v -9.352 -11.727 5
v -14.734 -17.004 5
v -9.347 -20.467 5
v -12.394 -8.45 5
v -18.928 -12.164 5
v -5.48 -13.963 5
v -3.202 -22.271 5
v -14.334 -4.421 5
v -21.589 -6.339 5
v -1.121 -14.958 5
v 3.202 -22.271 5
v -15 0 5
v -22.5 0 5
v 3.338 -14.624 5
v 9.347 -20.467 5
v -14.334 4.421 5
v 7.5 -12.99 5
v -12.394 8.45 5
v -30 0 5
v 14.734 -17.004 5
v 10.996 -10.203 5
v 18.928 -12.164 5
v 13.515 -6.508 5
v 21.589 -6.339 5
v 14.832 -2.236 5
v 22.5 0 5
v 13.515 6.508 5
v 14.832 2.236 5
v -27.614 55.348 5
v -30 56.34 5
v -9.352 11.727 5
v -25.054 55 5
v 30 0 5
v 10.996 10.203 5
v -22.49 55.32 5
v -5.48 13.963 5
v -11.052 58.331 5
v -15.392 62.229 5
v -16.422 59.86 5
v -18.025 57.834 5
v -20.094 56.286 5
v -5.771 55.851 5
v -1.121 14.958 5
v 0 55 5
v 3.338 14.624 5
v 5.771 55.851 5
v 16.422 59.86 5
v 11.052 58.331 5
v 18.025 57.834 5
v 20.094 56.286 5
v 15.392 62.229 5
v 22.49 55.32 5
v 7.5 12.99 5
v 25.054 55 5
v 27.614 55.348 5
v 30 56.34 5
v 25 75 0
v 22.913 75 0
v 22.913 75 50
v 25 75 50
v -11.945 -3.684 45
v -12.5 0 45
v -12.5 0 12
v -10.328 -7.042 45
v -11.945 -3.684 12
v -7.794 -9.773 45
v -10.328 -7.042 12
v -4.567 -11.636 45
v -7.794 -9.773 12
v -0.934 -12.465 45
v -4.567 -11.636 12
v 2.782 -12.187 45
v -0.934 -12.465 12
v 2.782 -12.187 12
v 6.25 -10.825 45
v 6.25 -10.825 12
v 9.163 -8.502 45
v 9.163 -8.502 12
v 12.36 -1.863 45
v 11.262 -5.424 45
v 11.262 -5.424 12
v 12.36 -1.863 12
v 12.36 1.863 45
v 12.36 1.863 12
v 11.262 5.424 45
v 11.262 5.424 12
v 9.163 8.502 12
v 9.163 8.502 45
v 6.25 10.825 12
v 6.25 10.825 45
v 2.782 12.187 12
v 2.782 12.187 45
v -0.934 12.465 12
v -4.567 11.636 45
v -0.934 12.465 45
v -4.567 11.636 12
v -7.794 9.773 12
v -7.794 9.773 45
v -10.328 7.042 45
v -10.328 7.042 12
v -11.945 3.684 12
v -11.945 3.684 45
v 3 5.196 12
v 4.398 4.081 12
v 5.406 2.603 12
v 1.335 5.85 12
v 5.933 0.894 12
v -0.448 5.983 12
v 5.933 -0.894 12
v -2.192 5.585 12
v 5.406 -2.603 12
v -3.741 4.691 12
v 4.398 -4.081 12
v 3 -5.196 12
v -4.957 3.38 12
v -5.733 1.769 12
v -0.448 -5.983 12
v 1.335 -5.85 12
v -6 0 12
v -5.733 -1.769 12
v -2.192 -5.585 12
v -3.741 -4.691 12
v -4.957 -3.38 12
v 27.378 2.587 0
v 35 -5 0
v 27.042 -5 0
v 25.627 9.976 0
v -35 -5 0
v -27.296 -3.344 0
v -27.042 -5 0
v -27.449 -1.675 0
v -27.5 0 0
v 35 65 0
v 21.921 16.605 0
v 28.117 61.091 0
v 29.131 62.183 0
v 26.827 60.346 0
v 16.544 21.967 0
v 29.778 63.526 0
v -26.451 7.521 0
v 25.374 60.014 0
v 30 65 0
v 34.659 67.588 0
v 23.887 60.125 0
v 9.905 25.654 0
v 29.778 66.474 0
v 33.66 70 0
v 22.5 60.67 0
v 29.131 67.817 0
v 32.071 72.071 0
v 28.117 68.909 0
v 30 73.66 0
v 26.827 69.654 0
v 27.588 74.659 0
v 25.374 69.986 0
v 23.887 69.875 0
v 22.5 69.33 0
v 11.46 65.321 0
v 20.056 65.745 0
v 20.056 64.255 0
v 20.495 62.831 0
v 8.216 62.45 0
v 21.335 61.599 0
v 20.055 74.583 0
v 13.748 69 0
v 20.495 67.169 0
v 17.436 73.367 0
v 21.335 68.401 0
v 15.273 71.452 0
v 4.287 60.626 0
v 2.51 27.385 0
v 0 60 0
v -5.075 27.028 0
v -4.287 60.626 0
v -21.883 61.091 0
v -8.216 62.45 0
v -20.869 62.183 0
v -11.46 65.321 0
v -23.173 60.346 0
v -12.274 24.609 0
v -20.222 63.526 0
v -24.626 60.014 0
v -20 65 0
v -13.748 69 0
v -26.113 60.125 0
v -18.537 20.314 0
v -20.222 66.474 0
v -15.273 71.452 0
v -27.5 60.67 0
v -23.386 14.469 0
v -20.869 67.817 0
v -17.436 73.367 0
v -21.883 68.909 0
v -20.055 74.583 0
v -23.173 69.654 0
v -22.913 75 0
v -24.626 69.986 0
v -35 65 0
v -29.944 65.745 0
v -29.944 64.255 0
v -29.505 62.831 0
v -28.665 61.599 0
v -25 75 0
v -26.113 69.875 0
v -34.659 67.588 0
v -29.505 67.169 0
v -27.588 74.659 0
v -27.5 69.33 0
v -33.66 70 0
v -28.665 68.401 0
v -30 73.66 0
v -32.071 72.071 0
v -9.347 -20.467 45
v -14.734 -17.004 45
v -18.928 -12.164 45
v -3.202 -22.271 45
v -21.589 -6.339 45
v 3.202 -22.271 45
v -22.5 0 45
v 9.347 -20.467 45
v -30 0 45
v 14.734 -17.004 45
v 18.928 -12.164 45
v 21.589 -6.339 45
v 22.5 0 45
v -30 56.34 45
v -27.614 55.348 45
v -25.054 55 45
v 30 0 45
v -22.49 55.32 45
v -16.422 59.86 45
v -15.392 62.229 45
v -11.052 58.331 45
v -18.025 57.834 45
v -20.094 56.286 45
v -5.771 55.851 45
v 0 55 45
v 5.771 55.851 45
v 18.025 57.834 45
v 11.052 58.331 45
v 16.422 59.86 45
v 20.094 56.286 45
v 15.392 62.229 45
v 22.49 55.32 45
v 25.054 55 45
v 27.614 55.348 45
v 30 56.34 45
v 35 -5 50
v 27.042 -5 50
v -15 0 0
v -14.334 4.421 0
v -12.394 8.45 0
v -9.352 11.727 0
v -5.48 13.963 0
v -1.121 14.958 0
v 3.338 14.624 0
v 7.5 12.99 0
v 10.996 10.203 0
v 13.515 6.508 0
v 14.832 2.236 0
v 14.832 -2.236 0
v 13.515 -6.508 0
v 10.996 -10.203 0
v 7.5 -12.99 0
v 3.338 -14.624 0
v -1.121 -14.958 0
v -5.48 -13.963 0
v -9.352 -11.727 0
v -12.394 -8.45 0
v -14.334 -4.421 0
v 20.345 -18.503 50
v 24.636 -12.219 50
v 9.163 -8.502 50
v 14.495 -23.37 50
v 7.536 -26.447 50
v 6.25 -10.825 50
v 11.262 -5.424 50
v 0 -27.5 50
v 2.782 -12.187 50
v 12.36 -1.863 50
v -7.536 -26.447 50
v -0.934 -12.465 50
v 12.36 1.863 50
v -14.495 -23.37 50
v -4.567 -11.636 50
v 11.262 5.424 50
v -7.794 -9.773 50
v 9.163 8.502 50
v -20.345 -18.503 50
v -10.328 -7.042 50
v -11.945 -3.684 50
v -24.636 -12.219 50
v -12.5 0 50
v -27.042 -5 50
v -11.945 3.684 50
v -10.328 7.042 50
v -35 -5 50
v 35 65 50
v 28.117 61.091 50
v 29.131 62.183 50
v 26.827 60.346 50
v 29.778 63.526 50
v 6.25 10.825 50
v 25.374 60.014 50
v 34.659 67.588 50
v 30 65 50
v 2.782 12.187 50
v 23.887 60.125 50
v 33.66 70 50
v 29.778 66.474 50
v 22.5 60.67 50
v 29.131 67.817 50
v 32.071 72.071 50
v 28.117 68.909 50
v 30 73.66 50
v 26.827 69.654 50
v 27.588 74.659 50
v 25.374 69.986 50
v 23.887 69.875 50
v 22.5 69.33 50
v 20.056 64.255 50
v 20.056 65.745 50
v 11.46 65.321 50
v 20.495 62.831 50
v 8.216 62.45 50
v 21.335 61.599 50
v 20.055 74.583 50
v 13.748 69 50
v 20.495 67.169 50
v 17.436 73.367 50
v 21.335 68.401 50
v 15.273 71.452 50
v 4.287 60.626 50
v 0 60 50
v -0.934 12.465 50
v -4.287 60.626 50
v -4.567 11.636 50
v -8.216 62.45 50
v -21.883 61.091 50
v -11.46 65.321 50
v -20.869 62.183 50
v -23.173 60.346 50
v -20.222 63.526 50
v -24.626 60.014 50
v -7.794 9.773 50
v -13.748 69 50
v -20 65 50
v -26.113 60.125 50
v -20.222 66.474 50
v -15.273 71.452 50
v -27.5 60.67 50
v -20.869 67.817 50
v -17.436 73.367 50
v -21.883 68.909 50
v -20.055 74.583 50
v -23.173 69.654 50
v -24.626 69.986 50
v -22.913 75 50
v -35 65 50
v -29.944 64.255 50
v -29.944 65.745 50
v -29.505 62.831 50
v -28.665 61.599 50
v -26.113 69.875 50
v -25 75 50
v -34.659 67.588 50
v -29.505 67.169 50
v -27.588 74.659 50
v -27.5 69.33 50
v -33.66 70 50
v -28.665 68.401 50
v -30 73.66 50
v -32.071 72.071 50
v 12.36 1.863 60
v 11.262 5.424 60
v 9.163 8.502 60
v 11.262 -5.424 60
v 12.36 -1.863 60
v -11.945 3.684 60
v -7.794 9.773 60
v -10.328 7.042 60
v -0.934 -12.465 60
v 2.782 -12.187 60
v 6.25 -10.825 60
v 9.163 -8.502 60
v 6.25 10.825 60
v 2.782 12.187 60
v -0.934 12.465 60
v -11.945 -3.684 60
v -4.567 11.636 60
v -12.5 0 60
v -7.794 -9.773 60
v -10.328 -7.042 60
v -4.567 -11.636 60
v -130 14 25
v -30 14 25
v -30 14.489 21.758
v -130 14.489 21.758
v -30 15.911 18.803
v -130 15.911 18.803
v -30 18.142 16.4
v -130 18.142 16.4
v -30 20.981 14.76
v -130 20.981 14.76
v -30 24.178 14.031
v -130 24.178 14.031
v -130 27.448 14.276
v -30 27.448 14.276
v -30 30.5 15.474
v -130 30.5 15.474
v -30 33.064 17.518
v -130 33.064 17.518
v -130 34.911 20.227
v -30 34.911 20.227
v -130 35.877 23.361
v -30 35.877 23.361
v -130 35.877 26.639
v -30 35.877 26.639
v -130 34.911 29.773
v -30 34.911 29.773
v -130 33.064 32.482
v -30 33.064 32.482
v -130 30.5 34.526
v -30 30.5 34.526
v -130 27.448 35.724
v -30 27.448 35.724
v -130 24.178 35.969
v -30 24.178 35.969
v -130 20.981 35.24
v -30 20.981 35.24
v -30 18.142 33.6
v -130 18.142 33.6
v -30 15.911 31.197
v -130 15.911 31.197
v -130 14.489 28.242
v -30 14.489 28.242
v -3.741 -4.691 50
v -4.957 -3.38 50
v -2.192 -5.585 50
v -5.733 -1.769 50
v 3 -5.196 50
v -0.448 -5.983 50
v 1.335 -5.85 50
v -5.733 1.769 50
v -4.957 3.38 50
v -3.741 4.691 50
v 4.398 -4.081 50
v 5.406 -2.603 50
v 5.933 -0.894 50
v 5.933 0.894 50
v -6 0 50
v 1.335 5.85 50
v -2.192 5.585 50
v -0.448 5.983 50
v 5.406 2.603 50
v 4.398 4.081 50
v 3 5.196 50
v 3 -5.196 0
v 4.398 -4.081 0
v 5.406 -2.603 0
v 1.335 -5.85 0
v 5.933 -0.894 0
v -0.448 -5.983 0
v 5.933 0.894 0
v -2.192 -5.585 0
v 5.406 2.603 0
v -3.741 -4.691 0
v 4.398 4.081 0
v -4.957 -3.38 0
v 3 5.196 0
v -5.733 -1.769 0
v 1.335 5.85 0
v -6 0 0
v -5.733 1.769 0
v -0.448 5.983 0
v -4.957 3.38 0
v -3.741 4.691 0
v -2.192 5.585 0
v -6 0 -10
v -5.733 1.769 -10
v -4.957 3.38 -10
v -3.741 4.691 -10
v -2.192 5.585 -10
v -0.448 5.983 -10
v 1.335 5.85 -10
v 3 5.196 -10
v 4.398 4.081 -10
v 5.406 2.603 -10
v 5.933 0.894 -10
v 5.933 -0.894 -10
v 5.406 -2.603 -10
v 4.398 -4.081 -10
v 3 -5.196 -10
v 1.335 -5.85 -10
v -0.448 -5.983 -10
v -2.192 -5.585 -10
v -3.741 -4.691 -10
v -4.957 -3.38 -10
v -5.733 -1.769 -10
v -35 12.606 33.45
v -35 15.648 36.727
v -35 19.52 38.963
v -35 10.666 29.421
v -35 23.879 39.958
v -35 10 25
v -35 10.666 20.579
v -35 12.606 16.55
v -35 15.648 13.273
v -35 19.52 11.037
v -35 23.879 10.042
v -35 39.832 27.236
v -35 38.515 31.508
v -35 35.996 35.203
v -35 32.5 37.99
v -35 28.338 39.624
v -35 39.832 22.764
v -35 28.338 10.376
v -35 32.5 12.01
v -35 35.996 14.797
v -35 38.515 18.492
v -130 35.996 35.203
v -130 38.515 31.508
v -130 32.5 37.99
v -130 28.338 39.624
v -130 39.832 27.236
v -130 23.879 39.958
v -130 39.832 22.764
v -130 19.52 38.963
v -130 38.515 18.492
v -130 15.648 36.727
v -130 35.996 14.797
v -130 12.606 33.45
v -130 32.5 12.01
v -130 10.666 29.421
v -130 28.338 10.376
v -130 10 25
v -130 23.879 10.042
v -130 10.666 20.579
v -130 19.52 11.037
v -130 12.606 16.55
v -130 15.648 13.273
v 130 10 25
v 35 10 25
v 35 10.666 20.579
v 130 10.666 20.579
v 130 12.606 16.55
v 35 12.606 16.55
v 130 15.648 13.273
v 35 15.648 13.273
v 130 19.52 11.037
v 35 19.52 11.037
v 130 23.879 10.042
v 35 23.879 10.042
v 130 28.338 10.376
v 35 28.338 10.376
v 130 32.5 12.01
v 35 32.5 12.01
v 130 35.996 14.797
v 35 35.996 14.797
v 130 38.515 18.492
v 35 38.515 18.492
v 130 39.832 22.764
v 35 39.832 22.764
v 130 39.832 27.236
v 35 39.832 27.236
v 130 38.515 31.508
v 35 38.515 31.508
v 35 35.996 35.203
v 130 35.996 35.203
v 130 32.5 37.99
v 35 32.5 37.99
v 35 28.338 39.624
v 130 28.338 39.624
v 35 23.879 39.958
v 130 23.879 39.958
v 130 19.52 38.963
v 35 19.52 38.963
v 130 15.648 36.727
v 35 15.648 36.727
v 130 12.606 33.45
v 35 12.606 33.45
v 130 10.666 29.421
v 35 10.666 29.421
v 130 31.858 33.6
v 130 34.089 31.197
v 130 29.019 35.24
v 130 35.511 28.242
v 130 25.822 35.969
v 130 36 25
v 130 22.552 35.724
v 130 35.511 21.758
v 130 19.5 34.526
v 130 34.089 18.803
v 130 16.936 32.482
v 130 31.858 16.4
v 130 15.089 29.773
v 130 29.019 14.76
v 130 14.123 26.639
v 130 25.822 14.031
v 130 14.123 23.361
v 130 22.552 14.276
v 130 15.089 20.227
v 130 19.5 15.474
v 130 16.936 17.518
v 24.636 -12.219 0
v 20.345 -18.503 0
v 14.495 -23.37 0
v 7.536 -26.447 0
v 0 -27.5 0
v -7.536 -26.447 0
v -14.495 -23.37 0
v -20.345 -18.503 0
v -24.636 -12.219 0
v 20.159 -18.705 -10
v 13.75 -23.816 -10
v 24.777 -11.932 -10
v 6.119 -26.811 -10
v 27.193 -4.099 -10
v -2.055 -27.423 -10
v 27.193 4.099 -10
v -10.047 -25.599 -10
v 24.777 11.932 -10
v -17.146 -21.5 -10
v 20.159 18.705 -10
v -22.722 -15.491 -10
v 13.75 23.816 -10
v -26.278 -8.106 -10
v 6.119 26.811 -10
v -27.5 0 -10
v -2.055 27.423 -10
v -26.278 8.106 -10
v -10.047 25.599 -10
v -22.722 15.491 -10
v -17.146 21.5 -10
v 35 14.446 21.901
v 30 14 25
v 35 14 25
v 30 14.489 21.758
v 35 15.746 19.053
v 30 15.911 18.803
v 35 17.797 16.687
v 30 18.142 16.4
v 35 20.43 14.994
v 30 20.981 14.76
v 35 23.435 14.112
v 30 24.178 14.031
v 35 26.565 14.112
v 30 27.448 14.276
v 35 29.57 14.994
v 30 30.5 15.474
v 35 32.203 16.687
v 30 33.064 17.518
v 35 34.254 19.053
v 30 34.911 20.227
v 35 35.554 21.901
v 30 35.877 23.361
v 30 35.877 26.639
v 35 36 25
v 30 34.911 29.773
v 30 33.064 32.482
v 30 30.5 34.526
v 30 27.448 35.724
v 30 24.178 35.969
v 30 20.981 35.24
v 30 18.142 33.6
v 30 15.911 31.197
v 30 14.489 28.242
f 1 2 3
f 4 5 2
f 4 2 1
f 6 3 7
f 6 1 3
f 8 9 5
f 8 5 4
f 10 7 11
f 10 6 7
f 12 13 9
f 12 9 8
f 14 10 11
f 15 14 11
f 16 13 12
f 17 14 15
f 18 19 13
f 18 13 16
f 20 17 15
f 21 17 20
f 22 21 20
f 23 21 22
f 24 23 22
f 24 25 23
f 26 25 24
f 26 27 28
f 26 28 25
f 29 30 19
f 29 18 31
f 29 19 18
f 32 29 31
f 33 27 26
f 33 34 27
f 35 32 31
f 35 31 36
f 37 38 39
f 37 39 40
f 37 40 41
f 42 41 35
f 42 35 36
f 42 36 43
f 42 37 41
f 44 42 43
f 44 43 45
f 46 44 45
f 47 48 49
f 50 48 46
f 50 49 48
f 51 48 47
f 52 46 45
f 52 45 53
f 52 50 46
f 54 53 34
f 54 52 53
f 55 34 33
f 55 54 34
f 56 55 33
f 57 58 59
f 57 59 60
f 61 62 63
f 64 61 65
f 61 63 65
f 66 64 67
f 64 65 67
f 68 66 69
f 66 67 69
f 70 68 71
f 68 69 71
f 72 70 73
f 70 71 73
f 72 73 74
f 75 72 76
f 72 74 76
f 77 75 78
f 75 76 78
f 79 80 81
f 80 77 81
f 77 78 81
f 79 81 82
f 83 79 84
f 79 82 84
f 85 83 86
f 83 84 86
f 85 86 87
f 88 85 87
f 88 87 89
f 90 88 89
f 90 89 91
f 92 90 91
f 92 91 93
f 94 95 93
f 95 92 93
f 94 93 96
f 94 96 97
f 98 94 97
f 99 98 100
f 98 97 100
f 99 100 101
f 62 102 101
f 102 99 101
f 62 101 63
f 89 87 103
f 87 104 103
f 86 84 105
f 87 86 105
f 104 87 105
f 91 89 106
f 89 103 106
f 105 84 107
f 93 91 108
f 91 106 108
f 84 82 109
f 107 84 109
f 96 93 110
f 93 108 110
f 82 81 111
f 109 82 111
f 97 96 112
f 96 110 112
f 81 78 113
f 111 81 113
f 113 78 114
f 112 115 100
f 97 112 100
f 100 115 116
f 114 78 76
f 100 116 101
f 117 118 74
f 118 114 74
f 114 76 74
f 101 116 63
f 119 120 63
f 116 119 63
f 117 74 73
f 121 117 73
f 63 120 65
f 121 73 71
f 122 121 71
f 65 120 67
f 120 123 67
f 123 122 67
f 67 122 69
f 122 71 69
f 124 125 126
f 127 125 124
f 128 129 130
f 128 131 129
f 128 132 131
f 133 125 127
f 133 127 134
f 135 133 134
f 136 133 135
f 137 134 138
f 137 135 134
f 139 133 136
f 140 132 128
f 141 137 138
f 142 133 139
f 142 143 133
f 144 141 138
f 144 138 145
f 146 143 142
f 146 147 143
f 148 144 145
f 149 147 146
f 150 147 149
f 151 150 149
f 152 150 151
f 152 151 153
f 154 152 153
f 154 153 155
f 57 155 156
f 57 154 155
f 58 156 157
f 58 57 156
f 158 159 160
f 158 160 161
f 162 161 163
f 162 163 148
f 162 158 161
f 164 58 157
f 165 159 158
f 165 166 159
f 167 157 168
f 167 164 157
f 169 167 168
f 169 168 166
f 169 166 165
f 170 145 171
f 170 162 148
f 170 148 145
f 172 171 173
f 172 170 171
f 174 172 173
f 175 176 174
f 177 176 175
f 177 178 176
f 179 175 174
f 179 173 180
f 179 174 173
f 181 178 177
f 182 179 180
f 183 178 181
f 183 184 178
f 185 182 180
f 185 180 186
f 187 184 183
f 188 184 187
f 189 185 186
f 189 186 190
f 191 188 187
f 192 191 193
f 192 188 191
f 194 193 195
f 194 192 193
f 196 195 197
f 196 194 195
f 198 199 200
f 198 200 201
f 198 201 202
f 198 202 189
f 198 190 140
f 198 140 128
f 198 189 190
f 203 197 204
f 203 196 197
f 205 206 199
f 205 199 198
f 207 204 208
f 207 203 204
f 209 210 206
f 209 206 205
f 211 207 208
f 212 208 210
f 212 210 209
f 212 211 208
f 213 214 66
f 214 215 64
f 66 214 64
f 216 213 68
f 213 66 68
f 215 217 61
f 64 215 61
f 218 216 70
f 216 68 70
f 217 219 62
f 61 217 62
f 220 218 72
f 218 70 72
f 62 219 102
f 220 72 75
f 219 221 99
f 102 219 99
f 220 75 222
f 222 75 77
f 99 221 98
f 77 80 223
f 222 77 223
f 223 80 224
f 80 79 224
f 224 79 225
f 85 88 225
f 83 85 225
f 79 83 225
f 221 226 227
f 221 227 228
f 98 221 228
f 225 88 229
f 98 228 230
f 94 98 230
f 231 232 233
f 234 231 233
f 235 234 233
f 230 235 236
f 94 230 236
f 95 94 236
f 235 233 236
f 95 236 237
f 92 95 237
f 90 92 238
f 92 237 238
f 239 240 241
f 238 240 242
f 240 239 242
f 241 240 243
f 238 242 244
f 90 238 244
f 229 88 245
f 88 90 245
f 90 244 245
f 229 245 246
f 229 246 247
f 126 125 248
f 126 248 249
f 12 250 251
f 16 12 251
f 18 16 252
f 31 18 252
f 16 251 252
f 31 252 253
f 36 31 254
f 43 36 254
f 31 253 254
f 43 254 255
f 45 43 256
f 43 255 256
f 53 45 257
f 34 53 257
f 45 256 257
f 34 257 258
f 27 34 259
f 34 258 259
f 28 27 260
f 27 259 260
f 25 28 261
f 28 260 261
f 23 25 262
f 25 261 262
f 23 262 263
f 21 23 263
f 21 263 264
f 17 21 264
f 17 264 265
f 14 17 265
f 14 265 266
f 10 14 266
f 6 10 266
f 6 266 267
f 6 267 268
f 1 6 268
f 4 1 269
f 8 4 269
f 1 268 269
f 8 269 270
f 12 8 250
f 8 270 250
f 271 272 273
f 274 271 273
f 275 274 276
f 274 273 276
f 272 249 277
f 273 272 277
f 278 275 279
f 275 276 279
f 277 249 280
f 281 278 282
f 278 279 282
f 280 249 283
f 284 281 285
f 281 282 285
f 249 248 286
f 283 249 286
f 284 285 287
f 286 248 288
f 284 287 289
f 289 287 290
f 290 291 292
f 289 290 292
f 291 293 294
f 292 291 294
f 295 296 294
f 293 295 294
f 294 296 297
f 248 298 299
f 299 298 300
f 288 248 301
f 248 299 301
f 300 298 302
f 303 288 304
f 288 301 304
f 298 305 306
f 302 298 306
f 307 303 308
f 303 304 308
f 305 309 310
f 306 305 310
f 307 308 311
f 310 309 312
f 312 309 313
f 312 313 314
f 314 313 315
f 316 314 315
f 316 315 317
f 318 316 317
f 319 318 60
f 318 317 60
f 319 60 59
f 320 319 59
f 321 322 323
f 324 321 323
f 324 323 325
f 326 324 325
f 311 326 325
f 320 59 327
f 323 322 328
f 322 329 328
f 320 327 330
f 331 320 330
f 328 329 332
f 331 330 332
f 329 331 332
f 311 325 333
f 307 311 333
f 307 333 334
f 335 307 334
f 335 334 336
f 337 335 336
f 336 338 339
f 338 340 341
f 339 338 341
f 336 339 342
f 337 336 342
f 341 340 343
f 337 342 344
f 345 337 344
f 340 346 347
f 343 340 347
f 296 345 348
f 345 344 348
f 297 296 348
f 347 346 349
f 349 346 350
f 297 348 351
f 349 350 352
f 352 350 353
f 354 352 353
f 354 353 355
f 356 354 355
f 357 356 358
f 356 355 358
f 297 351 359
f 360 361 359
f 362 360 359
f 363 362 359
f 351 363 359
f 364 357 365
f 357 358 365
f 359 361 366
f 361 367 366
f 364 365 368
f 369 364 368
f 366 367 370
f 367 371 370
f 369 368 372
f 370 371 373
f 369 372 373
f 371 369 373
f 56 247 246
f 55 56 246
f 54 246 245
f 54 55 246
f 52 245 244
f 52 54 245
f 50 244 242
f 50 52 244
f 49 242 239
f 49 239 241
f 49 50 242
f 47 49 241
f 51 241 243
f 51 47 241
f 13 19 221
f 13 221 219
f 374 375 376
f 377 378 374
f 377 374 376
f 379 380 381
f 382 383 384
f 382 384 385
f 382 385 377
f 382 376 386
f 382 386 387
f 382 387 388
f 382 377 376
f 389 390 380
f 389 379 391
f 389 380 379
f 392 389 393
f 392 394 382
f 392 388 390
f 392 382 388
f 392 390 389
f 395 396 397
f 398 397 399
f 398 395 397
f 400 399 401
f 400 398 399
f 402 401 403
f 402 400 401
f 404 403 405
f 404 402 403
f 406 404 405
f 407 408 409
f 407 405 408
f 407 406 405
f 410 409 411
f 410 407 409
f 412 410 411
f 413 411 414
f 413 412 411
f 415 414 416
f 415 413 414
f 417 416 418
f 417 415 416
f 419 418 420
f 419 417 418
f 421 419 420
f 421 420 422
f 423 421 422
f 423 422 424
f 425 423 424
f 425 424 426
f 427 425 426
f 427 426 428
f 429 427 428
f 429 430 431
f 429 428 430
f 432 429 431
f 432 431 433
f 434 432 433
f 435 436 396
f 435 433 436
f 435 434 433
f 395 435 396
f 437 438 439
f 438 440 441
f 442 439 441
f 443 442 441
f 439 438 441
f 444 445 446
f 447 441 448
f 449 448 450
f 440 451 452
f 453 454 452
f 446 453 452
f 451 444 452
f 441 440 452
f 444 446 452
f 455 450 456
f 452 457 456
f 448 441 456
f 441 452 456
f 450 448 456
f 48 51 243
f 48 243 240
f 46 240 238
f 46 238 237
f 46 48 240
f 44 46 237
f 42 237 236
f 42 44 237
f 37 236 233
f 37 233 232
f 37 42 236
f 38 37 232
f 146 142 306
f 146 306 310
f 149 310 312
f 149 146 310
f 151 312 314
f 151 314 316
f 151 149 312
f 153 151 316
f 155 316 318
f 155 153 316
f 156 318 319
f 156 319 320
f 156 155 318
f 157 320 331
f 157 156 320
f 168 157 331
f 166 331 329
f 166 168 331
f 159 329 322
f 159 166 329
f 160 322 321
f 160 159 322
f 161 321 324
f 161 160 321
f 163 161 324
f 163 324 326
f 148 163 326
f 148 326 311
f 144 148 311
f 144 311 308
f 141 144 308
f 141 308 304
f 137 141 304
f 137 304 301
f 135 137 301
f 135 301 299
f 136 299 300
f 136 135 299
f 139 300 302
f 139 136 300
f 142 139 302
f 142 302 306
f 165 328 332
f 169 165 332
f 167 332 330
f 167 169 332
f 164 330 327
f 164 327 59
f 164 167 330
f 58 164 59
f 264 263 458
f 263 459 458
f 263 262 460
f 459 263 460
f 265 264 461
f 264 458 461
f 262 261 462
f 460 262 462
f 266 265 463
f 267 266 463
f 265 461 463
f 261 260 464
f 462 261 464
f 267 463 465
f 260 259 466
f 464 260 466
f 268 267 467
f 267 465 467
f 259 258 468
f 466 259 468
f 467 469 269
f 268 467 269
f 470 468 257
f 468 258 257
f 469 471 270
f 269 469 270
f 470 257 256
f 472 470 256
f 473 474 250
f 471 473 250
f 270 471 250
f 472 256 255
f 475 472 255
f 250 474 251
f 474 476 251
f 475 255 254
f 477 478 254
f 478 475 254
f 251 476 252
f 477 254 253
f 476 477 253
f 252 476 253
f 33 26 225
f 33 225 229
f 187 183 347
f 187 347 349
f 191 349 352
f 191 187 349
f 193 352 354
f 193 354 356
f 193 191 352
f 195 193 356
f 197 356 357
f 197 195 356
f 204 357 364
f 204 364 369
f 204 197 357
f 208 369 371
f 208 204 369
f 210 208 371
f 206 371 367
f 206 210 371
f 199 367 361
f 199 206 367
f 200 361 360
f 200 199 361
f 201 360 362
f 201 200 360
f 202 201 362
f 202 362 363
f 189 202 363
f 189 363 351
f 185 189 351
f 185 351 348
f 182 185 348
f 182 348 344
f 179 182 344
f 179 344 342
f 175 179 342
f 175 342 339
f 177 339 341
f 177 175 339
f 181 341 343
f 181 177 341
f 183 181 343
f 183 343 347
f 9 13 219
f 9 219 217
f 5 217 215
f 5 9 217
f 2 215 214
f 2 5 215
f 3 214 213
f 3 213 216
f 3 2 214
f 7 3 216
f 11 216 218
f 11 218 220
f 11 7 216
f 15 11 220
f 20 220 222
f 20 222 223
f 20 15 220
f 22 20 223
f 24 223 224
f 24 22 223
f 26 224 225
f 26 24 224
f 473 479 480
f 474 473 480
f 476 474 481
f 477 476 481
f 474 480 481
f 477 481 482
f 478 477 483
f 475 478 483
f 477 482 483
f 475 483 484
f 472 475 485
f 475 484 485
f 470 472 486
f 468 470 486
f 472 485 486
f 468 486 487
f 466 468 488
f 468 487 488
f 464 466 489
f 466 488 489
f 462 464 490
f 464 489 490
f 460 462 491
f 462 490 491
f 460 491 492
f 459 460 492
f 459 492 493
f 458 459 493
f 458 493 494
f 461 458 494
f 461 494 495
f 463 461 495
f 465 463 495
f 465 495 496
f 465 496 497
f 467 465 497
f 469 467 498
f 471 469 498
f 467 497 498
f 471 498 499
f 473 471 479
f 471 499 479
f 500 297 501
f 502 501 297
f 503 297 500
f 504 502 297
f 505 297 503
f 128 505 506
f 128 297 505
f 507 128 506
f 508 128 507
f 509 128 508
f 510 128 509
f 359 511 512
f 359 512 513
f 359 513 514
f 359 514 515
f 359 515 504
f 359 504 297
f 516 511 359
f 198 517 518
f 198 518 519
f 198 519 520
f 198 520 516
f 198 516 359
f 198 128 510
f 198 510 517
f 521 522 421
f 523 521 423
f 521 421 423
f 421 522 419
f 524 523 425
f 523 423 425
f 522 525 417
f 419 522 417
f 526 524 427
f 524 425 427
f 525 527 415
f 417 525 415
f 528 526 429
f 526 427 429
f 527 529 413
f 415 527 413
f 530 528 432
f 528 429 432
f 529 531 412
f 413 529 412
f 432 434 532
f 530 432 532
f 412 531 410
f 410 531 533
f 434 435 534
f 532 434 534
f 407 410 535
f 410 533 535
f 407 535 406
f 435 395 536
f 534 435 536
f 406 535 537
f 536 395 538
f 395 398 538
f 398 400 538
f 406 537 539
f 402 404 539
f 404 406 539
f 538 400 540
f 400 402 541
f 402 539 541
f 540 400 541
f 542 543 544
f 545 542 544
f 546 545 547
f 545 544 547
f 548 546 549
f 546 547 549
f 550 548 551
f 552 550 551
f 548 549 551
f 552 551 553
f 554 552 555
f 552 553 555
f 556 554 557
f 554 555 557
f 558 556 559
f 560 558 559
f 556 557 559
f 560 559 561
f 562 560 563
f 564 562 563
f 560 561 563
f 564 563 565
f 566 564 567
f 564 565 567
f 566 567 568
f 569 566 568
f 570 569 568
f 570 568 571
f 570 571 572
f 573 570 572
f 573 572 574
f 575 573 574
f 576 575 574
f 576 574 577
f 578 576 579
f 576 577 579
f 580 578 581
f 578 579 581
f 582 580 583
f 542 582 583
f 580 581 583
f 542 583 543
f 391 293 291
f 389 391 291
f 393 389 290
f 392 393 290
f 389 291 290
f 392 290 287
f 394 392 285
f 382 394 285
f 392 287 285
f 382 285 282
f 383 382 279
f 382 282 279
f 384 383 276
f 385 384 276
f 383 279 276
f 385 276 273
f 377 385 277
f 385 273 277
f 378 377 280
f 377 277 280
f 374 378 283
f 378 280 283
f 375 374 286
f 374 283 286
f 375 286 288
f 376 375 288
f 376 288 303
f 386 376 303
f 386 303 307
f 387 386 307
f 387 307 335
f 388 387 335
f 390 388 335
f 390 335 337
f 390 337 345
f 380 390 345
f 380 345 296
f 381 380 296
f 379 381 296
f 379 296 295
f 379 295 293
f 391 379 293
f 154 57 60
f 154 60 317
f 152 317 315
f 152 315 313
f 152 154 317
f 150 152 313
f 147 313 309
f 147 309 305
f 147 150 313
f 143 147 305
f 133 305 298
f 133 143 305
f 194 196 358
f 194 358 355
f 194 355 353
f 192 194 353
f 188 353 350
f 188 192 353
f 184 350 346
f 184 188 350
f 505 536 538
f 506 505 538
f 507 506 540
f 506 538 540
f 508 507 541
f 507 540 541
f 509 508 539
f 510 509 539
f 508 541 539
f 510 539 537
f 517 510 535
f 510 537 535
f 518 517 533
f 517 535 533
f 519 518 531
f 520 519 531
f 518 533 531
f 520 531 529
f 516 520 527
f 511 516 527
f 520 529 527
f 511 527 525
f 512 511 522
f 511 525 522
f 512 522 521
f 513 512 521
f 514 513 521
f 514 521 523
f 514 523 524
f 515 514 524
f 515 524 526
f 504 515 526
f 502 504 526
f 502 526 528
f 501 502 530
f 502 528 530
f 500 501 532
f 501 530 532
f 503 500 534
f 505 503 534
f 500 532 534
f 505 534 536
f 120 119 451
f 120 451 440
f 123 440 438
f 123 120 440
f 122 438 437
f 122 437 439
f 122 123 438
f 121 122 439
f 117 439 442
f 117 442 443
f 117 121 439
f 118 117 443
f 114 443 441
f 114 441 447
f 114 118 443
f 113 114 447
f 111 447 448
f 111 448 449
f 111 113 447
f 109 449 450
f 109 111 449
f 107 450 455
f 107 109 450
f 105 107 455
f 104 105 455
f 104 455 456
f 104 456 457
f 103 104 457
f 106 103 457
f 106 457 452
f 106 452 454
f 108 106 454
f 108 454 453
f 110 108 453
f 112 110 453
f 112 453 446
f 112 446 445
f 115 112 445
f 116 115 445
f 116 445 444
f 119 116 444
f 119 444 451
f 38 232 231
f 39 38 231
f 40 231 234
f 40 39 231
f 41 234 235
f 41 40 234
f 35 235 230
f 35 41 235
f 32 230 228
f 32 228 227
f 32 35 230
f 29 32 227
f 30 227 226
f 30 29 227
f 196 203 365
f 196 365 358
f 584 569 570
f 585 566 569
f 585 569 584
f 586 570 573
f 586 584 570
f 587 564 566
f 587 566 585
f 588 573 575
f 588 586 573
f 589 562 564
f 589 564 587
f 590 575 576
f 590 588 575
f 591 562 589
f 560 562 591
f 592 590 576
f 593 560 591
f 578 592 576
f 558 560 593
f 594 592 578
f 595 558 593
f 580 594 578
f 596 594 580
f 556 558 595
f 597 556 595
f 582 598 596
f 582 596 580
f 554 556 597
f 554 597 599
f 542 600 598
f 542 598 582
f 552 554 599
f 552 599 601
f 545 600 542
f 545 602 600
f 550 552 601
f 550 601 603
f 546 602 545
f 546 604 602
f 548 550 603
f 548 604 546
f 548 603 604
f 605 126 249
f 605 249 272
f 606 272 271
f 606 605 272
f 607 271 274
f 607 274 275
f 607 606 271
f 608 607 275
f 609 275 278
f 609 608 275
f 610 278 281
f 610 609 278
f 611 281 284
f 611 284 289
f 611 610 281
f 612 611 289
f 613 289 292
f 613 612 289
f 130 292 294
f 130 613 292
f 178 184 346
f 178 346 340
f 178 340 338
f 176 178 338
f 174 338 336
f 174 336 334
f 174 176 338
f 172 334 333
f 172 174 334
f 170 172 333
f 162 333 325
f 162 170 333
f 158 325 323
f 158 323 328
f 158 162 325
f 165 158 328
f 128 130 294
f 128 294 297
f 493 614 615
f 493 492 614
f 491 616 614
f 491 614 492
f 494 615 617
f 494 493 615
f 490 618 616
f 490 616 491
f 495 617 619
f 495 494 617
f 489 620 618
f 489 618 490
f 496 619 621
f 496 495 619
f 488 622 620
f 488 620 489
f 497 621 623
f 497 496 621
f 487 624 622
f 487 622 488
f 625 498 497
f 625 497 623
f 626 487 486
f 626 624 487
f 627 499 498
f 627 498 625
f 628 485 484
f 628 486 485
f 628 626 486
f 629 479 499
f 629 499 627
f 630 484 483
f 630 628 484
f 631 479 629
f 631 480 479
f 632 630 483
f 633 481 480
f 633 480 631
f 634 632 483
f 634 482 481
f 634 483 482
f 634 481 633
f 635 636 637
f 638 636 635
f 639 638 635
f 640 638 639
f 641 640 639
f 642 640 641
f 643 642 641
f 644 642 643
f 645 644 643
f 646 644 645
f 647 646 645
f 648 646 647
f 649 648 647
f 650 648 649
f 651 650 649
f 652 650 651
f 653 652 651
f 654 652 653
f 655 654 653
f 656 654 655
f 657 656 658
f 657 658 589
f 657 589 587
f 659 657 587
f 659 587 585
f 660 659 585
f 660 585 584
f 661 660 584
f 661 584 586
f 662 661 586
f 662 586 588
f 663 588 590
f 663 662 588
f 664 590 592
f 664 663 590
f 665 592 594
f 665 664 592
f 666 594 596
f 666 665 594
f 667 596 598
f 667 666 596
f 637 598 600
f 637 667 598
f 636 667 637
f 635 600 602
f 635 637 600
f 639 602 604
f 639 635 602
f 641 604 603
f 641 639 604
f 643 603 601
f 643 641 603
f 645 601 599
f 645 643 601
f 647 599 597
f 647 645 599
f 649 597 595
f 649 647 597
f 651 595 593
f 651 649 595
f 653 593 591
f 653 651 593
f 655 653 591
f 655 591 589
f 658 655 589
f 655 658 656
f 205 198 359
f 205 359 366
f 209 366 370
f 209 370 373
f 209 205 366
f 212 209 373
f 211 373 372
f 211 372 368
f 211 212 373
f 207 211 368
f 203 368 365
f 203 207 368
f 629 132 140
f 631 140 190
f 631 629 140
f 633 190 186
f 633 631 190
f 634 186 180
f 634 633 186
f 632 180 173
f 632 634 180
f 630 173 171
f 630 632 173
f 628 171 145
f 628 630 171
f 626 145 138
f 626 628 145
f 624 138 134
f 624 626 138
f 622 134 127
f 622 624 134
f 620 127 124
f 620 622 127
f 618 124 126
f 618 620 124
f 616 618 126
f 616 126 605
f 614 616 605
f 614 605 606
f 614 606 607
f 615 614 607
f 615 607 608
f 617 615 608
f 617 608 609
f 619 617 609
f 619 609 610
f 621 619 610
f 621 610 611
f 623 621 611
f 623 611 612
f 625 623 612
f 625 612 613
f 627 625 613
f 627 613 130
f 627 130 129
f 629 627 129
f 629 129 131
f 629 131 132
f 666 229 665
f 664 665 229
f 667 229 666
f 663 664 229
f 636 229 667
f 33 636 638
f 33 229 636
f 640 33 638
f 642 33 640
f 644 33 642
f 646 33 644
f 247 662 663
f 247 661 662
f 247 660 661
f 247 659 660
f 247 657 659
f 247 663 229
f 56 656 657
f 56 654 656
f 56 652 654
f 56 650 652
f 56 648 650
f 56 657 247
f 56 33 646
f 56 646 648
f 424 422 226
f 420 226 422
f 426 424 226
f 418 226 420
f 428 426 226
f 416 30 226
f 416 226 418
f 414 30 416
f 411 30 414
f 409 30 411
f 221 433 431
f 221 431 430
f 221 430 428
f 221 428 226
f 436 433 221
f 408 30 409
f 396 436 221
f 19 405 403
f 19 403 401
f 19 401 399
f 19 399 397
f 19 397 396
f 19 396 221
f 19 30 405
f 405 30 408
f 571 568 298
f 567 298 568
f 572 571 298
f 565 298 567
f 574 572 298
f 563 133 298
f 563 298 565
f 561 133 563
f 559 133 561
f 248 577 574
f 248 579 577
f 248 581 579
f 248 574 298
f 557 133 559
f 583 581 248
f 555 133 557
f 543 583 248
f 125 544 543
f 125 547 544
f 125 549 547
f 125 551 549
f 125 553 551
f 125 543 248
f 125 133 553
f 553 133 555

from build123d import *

# Parameters (mm, degrees)
SKETCH1_R           = 5
BOSS_EXTRUDE2_DEPTH = 50
SHELL2_START        = 5
SHELL2_DEPTH        = 40
SKETCH3_R           = 15
CUT_EXTRUDE1_DEPTH  = 5
BOSS_EXTRUDE3_START = 10
SKETCH4_R           = 27.5
SKETCH4_R_2         = 6
BOSS_EXTRUDE3_DEPTH = 10
SKETCH5_R           = 15
SKETCH5_R_2         = 11
BOSS_EXTRUDE4_DEPTH = 95
CUT_EXTRUDE2_START  = -80
SKETCH5_2_R         = 11
CUT_EXTRUDE2_DEPTH  = 80
BOSS_EXTRUDE5_START = -165
SKETCH5_3_R         = 15
SKETCH5_3_R_2       = 11
BOSS_EXTRUDE5_DEPTH = 95
SKETCH6_R           = 12.5
SKETCH6_R_2         = 6
BOSS_EXTRUDE6_DEPTH = 5
CUT_EXTRUDE3_START  = -5
SKETCH6_2_R         = 6
CUT_EXTRUDE3_DEPTH  = 5
BOSS_EXTRUDE7_START = -38
SKETCH6_3_R         = 12.5
SKETCH6_3_R_2       = 6
BOSS_EXTRUDE7_DEPTH = 38
SKETCH6_4_R         = 12.5
SKETCH6_4_R_2       = 6
BOSS_EXTRUDE8_DEPTH = 10


# Read off the part's stored shape, not the designer's step: Shell2
with BuildPart() as part:
    # Sketch1 → Boss-Extrude2 (new body)
    with BuildSketch(Plane.XY):
        with BuildLine():
            Line((22.912878475, 75), (25, 75))
            ThreePointArc((25, 75), (32.071067812, 72.071067812), (35, 65))
            Line((35, 65), (35, -5))
            Line((35, -5), (27.041634566, -5))
            ThreePointArc((27.041634566, -5), (0, -27.5), (-27.041634566, -5))
            Line((-27.041634566, -5), (-35, -5))
            Line((-35, -5), (-35, 65))
            ThreePointArc((-35, 65), (-32.071067812, 72.071067812), (-25, 75))
            Line((-25, 75), (-22.912878475, 75))
            ThreePointArc((-22.912878475, 75), (-17.4356529, 73.366600265), (-13.747727085, 69))
            ThreePointArc((-13.747727085, 69), (0, 60), (13.747727085, 69))
            ThreePointArc((13.747727085, 69), (17.4356529, 73.366600265), (22.912878475, 75))
        make_face()
        with Locations((-25, 65)):
            Circle(SKETCH1_R, mode=Mode.SUBTRACT)
        with Locations((25, 65)):
            Circle(SKETCH1_R, mode=Mode.SUBTRACT)
    extrude(amount=BOSS_EXTRUDE2_DEPTH)

    # Shell2 outline → Shell2 (cut)
    with BuildSketch(Plane.XY.offset(SHELL2_START)):
        with BuildLine():
            Line((30, 0), (30, 56.339745962))
            ThreePointArc((30, 56.339745962), (21.260998255, 55.725310466), (15.391593697, 62.228984243))
            ThreePointArc((15.391593697, 62.228984243), (0, 55), (-15.391593697, 62.228984243))
            ThreePointArc((-15.391593697, 62.228984243), (-21.260998255, 55.725310466), (-30, 56.339745962))
            Line((-30, 56.339745962), (-30, 0))
            Line((-30, 0), (-22.5, 0))
            ThreePointArc((-22.5, 0), (0, -22.5), (22.5, 0))
            Line((22.5, 0), (30, 0))
        make_face()
    extrude(amount=SHELL2_DEPTH, mode=Mode.SUBTRACT)

    # Sketch3 → Cut-Extrude1 (cut)
    with BuildSketch(Plane(origin=(0, 0, 0), x_dir=(-1, 0, 0), z_dir=(0, 0, -1))):
        Circle(SKETCH3_R)
    extrude(amount=-CUT_EXTRUDE1_DEPTH, mode=Mode.SUBTRACT)

    # Sketch4 → Boss-Extrude3 (add)
    with BuildSketch(Plane(origin=(0, 0, 0), x_dir=(-1, 0, 0), z_dir=(0, 0, -1)).offset(BOSS_EXTRUDE3_START)):
        Circle(SKETCH4_R)
        Circle(SKETCH4_R_2, mode=Mode.SUBTRACT)
    extrude(amount=-BOSS_EXTRUDE3_DEPTH)

    # Sketch5 → Boss-Extrude4 (add)
    with BuildSketch(Plane(origin=(35, 0, 0), x_dir=(0, 0, -1), z_dir=(1, 0, 0))):
        with Locations(Location((-25, 25, 0), (0, 0, 270))):
            Circle(SKETCH5_R)
        with Locations(Location((-25, 25, 0), (0, 0, 90))):
            Circle(SKETCH5_R_2, mode=Mode.SUBTRACT)
    extrude(amount=BOSS_EXTRUDE4_DEPTH)

    # Sketch5<2> → Cut-Extrude2 (cut)
    with BuildSketch(Plane(origin=(35, 0, 0), x_dir=(0, 0, -1), z_dir=(1, 0, 0)).offset(CUT_EXTRUDE2_START)):
        with Locations(Location((-25, 25, 0), (0, 0, 270))):
            Circle(SKETCH5_2_R)
    extrude(amount=CUT_EXTRUDE2_DEPTH, mode=Mode.SUBTRACT)

    # Sketch5<3> → Boss-Extrude5 (add)
    with BuildSketch(Plane(origin=(35, 0, 0), x_dir=(0, 0, -1), z_dir=(1, 0, 0)).offset(BOSS_EXTRUDE5_START)):
        with Locations(Location((-25, 25, 0), (0, 0, 270))):
            Circle(SKETCH5_3_R)
        with Locations(Location((-25, 25, 0), (0, 0, 270))):
            Circle(SKETCH5_3_R_2, mode=Mode.SUBTRACT)
    extrude(amount=BOSS_EXTRUDE5_DEPTH)

    # Sketch6 → Boss-Extrude6 (add)
    with BuildSketch(Plane.XY.offset(50)):
        with Locations(Location((0, 0, 0), (0, 0, 180))):
            Circle(SKETCH6_R)
        with Locations(Location((0, 0, 0), (0, 0, 180))):
            Circle(SKETCH6_R_2, mode=Mode.SUBTRACT)
    extrude(amount=BOSS_EXTRUDE6_DEPTH)

    # Sketch6<2> → Cut-Extrude3 (cut)
    with BuildSketch(Plane.XY.offset(50).offset(CUT_EXTRUDE3_START)):
        with Locations(Location((0, 0, 0), (0, 0, 180))):
            Circle(SKETCH6_2_R)
    extrude(amount=CUT_EXTRUDE3_DEPTH, mode=Mode.SUBTRACT)

    # Sketch6<3> → Boss-Extrude7 (add)
    with BuildSketch(Plane.XY.offset(50).offset(BOSS_EXTRUDE7_START)):
        with Locations(Location((0, 0, 0), (0, 0, 180))):
            Circle(SKETCH6_3_R)
        with Locations(Location((0, 0, 0), (0, 0, 180))):
            Circle(SKETCH6_3_R_2, mode=Mode.SUBTRACT)
    extrude(amount=BOSS_EXTRUDE7_DEPTH)

    # Sketch6<4> → Boss-Extrude8 (add)
    # profile 1 of 2: a face of its own
    with BuildSketch(Plane.XY.offset(50)):
        with Locations(Location((0, 0, 0), (0, 0, 180))):
            Circle(SKETCH6_4_R)
        Circle(SKETCH6_4_R_2, mode=Mode.SUBTRACT)
    # profile 2 of 2: a face of its own
    with BuildSketch(Plane.XY.offset(50)):
        Circle(SKETCH6_4_R_2)
    extrude(amount=BOSS_EXTRUDE8_DEPTH)


solid = part.part
